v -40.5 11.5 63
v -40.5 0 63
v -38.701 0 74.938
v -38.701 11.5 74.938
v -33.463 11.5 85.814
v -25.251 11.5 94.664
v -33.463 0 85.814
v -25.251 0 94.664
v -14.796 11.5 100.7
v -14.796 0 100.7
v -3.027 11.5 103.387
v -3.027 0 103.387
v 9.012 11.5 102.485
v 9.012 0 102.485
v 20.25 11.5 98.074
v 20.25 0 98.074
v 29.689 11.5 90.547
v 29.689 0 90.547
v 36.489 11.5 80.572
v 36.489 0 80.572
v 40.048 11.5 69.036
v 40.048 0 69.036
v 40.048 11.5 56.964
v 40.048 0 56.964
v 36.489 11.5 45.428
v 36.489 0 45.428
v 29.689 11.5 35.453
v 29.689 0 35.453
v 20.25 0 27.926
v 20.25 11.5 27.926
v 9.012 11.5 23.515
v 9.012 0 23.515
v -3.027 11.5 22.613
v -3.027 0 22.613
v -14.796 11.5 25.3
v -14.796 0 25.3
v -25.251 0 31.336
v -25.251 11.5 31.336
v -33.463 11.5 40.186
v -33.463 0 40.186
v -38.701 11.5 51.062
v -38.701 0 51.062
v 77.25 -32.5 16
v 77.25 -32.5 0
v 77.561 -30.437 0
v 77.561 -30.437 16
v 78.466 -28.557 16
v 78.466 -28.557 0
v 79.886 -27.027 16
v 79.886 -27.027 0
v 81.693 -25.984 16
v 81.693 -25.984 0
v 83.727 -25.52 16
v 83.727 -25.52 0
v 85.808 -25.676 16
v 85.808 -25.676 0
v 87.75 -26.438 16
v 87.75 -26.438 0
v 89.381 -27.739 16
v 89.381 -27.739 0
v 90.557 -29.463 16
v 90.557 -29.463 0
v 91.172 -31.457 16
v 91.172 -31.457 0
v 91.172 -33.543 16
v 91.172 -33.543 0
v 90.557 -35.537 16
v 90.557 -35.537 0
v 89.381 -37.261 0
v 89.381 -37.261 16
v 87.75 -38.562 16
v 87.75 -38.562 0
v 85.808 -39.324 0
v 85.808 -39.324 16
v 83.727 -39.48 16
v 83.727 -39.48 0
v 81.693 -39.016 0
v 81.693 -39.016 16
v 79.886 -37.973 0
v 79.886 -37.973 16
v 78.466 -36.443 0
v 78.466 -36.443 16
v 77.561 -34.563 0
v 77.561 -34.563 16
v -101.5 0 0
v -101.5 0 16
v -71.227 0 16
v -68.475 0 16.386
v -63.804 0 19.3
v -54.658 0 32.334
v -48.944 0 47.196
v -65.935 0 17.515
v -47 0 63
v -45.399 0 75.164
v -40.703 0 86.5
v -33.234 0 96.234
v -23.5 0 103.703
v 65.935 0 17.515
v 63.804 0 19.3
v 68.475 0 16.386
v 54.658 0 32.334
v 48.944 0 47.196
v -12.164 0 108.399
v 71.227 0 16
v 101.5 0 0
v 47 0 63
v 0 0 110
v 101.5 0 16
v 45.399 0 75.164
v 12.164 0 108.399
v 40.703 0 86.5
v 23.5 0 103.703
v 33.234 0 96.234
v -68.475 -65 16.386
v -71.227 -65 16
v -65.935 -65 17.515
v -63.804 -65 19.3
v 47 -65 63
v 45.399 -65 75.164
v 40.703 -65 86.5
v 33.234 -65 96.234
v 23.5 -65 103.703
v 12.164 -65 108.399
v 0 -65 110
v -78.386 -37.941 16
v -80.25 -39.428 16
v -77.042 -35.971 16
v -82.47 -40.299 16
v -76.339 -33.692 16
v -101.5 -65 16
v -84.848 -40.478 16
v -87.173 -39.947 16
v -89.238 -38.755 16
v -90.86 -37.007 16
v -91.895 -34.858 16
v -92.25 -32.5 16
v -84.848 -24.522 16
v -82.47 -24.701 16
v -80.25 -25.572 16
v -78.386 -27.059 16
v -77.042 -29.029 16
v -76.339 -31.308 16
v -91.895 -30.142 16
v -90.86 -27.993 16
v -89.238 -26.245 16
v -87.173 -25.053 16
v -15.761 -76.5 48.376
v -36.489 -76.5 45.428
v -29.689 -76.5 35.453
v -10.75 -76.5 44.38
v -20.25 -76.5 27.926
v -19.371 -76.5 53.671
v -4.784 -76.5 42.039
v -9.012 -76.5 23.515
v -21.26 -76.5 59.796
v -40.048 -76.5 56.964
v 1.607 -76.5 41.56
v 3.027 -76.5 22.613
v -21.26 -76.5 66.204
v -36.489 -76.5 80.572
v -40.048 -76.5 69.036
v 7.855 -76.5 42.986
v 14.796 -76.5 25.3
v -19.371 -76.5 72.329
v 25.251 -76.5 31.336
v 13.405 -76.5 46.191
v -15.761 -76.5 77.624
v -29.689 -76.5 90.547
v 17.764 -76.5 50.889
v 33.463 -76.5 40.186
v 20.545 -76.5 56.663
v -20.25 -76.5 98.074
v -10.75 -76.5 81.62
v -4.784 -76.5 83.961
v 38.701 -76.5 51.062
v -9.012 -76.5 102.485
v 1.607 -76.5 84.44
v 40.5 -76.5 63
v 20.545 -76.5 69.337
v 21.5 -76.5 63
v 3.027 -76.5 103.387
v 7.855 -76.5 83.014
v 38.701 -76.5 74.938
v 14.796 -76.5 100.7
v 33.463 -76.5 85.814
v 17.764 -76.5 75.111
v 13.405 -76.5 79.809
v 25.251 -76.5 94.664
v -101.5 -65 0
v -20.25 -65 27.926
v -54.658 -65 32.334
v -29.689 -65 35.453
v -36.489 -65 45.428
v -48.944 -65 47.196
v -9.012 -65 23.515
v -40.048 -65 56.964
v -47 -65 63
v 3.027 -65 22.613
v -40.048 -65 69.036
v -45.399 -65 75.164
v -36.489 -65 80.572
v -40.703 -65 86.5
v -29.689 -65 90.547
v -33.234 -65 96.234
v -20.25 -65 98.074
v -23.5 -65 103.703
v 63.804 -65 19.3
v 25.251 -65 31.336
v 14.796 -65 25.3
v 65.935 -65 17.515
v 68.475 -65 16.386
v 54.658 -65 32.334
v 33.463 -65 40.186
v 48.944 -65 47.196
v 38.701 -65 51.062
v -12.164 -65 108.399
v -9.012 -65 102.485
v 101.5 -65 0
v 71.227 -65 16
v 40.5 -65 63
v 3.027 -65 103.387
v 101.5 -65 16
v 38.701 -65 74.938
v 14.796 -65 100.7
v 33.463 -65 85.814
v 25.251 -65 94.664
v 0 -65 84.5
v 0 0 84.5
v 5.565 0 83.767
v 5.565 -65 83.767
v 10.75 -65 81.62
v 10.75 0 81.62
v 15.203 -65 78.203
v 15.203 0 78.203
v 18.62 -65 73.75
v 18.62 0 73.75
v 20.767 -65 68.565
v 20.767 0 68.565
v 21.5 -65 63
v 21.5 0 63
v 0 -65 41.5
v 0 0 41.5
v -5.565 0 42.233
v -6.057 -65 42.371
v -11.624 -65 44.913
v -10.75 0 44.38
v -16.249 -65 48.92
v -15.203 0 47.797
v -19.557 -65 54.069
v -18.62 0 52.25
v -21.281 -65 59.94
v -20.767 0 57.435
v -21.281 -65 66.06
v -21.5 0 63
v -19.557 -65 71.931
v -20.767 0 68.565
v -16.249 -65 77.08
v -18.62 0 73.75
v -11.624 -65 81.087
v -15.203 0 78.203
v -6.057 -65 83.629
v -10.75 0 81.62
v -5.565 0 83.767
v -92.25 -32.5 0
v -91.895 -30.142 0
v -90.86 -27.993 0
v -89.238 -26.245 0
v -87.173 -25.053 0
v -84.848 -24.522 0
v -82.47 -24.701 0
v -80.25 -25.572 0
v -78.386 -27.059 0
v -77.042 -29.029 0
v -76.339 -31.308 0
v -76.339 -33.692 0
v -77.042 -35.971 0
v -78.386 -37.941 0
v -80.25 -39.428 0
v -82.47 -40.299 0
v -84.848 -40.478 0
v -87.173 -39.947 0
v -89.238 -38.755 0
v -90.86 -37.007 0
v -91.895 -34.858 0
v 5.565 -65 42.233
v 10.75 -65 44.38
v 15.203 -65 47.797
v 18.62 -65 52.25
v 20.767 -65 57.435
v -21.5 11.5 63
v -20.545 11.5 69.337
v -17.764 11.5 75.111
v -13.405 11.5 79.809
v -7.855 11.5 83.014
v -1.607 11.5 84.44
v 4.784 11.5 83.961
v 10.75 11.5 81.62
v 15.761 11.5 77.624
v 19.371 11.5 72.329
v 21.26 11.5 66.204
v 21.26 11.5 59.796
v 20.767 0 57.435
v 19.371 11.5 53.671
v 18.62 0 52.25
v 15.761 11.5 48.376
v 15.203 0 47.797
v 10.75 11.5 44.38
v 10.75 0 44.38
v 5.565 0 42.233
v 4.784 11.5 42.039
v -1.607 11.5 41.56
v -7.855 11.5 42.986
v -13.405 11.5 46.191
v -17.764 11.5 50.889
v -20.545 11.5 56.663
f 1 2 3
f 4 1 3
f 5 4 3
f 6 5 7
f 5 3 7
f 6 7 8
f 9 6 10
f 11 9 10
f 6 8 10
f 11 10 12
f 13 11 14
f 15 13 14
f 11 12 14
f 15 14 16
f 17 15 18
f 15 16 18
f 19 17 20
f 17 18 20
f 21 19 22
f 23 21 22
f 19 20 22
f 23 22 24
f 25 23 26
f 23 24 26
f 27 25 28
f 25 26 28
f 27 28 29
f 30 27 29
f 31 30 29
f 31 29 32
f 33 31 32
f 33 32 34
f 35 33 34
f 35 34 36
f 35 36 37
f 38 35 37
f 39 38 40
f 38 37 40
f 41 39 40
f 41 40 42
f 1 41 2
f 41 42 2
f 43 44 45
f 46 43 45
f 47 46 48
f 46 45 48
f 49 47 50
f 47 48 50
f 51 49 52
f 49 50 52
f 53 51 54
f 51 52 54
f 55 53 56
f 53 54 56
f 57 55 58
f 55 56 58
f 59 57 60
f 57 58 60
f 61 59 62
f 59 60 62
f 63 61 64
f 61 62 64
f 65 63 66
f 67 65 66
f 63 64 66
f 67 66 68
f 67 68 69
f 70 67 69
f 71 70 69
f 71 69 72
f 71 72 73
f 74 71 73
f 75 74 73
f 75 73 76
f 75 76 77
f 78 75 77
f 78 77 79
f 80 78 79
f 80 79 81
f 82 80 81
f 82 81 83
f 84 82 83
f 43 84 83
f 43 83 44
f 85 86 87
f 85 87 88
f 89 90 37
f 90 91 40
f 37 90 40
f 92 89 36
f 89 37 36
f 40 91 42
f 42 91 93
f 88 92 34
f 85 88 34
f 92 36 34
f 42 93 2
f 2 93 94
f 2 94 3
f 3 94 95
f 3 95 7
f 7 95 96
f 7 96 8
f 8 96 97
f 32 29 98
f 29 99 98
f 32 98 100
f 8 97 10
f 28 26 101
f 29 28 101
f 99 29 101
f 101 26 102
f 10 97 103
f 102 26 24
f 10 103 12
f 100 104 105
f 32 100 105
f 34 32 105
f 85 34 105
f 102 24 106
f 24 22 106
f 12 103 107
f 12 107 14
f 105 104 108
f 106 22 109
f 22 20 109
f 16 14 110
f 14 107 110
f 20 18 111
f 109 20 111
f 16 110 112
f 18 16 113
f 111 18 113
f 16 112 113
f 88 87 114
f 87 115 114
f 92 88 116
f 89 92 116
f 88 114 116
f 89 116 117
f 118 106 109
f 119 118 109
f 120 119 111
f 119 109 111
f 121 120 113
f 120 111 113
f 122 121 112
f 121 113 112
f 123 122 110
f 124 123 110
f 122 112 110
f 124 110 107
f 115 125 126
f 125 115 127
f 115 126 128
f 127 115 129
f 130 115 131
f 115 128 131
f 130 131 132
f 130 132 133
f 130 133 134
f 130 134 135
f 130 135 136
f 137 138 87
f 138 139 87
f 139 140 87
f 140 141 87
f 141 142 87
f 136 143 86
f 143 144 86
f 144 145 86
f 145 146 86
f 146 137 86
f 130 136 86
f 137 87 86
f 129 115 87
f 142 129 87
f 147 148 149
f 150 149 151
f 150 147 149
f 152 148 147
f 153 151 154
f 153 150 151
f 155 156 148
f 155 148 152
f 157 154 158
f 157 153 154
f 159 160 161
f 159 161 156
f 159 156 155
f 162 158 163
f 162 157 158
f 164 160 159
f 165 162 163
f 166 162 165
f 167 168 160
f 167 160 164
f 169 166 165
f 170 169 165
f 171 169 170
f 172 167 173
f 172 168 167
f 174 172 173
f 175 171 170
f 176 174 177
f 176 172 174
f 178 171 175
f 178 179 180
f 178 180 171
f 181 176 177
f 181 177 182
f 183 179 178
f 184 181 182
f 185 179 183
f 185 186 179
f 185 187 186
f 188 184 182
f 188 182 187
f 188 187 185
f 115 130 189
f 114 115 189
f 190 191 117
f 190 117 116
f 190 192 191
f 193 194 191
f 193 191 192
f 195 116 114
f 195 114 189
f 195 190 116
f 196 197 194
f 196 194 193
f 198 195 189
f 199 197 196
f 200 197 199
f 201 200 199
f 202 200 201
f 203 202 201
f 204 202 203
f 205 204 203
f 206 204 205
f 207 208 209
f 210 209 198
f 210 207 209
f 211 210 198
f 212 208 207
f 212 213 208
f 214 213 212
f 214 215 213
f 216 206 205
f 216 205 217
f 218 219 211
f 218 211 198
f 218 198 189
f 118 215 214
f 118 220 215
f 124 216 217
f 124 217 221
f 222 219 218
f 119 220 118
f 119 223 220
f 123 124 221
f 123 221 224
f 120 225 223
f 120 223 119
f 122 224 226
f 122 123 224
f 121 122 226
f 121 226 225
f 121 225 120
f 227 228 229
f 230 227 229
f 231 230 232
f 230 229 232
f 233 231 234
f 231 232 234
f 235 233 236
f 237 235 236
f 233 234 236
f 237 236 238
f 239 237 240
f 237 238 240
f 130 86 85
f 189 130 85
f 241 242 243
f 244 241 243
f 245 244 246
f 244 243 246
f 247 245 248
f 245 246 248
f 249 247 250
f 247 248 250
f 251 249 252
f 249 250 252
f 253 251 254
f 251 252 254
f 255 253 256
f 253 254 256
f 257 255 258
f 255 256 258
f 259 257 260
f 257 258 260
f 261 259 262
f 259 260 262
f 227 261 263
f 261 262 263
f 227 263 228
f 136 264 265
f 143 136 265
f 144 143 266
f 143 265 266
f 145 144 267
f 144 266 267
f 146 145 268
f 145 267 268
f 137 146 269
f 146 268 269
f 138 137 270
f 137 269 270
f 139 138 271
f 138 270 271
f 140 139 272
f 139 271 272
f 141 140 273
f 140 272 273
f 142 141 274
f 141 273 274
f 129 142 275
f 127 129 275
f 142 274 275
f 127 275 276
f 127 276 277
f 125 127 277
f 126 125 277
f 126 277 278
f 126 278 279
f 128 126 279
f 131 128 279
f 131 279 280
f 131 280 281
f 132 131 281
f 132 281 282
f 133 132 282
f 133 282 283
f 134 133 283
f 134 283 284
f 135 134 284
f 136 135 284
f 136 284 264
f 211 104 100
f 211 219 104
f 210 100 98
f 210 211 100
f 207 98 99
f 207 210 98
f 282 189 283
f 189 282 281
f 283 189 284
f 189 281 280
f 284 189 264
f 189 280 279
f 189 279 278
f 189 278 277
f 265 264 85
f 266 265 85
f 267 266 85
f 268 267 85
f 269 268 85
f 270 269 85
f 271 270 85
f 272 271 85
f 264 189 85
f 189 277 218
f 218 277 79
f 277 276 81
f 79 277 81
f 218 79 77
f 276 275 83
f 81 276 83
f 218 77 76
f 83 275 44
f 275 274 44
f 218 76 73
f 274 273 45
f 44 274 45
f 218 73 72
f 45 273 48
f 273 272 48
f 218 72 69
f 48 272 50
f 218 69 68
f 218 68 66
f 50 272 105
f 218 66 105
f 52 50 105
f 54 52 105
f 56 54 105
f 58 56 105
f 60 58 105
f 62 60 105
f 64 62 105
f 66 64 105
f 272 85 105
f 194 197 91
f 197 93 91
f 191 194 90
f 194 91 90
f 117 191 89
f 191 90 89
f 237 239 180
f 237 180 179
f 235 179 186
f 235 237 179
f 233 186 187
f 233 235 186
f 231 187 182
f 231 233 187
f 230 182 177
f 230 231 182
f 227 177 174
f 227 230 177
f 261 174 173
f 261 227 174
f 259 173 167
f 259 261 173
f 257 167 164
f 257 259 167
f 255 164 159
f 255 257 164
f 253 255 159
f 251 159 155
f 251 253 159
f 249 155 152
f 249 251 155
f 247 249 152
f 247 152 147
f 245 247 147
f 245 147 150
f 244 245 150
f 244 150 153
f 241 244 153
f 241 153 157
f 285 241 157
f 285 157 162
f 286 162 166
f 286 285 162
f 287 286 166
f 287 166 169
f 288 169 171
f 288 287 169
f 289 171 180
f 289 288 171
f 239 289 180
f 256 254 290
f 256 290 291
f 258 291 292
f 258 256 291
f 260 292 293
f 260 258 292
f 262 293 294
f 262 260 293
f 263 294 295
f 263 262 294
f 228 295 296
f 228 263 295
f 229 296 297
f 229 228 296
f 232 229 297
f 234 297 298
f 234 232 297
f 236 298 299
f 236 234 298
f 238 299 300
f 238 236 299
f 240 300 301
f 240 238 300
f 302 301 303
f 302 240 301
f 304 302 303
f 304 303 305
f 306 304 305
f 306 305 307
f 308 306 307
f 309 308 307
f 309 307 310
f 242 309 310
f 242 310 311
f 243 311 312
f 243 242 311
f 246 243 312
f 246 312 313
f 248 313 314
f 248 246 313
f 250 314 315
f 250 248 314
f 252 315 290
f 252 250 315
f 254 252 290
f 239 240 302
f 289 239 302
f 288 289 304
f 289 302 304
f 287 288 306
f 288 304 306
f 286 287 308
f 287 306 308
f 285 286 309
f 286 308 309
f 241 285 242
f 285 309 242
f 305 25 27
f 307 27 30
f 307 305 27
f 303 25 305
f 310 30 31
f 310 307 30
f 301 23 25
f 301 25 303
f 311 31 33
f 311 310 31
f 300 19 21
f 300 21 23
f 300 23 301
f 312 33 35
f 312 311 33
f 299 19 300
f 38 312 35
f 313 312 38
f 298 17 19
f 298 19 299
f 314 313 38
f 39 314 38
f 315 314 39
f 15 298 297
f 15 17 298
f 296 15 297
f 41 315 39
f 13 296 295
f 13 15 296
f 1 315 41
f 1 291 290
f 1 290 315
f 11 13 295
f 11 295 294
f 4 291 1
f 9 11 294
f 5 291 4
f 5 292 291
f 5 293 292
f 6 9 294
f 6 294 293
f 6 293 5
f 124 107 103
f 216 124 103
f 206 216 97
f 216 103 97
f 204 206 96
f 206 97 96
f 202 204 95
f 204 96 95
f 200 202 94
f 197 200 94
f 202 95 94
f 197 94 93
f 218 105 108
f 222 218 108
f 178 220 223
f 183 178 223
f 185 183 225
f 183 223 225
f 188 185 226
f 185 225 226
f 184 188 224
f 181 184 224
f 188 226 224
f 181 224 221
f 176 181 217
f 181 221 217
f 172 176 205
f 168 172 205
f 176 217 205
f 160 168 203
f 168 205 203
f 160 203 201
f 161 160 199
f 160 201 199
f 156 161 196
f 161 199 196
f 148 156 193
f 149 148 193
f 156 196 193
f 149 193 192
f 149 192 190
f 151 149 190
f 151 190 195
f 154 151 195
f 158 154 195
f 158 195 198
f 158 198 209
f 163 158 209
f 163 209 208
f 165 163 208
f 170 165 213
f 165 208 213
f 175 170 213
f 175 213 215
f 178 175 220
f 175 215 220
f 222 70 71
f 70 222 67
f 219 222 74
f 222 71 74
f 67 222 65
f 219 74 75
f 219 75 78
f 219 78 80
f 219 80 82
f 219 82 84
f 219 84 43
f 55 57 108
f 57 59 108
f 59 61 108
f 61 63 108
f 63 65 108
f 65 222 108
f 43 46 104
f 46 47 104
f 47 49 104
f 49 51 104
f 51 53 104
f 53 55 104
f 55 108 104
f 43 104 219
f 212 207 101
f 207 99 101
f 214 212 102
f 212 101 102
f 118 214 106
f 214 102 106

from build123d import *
from build123d import SkipClean  # not in build123d's __all__

# Parameters (mm, degrees)
F1_DEPTH = 65
F2_R     = 40.5
F2_R_2   = 21.5
F3_DEPTH = 11.5
F4_R     = 40.5
F4_R_2   = 21.5
F5_DEPTH = 11.5
F7_D     = 14
F9_R     = 10
F10_D    = 16


# Not quite as in the source:
# - after a boolean that leaves OpenCascade's solid faulty, fix() repairs it


with BuildPart() as f1:
    # F0 (on Front) → F1 (new body)
    with BuildSketch(Plane.XZ):
        with BuildLine():
            Line((0, 16), (0, 0))
            Line((0, 0), (101.5, 0))
            Line((101.5, 0), (101.5, 16))
            Line((101.5, 16), (67, 16))
            ThreePointArc((67, 16), (52.2079138911, 37.4608144218), (47, 63))
            ThreePointArc((47, 63), (33.2340187158, 96.2340187158), (0, 110))
            Line((0, 110), (0, 84.5))
            ThreePointArc((0, 84.5), (15.2027957955, 78.2027957955), (21.5, 63))
            ThreePointArc((21.5, 63), (15.2027957955, 47.7972042045), (0, 41.5))
            Line((0, 41.5), (0, 16))
        make_face()
        with BuildLine():
            Line((-101.5, 0), (0, 0))
            Line((0, 0), (0, 16))
            Line((0, 16), (0, 41.5))
            ThreePointArc((0, 41.5), (-21.5, 63), (0, 84.5))
            Line((0, 84.5), (0, 110))
            ThreePointArc((0, 110), (-33.2340187158, 96.2340187158), (-47, 63))
            ThreePointArc((-47, 63), (-52.2079138911, 37.4608144218), (-67, 16))
            Line((-67, 16), (-101.5, 16))
            Line((-101.5, 16), (-101.5, 0))
        make_face()
    extrude(amount=F1_DEPTH)

    # F2 (on face) → F3 (join)
    with BuildSketch(Plane.XZ.offset(65)):
        with Locations((0, 63)):
            Circle(F2_R)
        with Locations((0, 63)):
            Circle(F2_R_2, mode=Mode.SUBTRACT)
    extrude(amount=F3_DEPTH)

    # F4 (on face) → F5 (join)
    with BuildSketch(Plane(origin=(0, 0, 0), x_dir=(-1, 0, 0), z_dir=(0, 1, 0))):
        with Locations((0, 63)):
            Circle(F4_R)
        with Locations((0, 63)):
            Circle(F4_R_2, mode=Mode.SUBTRACT)
    with SkipClean():  # cleaning this boolean's faces spoils the solid; the shape is the same uncleaned
        extrude(amount=F5_DEPTH)

    # F7 (through all)
    with Locations(Plane.XY.offset(16)):
        with Locations((84.25, -32.5)):
            Hole(F7_D / 2)

    add(f1.part.fix(), mode=Mode.REPLACE)

    # F9
    f9_edges = [f1.edges().sort_by_distance(p)[0] for p in [
        (-67, -32.5, 16),
        (67, -32.5, 16),
    ]]
    fillet(f9_edges, radius=F9_R)

    # F10 (through all)
    with Locations(Plane.XY.offset(16)):
        with Locations((-84.25, -32.5)):
            Hole(F10_D / 2)


solid = f1.part
